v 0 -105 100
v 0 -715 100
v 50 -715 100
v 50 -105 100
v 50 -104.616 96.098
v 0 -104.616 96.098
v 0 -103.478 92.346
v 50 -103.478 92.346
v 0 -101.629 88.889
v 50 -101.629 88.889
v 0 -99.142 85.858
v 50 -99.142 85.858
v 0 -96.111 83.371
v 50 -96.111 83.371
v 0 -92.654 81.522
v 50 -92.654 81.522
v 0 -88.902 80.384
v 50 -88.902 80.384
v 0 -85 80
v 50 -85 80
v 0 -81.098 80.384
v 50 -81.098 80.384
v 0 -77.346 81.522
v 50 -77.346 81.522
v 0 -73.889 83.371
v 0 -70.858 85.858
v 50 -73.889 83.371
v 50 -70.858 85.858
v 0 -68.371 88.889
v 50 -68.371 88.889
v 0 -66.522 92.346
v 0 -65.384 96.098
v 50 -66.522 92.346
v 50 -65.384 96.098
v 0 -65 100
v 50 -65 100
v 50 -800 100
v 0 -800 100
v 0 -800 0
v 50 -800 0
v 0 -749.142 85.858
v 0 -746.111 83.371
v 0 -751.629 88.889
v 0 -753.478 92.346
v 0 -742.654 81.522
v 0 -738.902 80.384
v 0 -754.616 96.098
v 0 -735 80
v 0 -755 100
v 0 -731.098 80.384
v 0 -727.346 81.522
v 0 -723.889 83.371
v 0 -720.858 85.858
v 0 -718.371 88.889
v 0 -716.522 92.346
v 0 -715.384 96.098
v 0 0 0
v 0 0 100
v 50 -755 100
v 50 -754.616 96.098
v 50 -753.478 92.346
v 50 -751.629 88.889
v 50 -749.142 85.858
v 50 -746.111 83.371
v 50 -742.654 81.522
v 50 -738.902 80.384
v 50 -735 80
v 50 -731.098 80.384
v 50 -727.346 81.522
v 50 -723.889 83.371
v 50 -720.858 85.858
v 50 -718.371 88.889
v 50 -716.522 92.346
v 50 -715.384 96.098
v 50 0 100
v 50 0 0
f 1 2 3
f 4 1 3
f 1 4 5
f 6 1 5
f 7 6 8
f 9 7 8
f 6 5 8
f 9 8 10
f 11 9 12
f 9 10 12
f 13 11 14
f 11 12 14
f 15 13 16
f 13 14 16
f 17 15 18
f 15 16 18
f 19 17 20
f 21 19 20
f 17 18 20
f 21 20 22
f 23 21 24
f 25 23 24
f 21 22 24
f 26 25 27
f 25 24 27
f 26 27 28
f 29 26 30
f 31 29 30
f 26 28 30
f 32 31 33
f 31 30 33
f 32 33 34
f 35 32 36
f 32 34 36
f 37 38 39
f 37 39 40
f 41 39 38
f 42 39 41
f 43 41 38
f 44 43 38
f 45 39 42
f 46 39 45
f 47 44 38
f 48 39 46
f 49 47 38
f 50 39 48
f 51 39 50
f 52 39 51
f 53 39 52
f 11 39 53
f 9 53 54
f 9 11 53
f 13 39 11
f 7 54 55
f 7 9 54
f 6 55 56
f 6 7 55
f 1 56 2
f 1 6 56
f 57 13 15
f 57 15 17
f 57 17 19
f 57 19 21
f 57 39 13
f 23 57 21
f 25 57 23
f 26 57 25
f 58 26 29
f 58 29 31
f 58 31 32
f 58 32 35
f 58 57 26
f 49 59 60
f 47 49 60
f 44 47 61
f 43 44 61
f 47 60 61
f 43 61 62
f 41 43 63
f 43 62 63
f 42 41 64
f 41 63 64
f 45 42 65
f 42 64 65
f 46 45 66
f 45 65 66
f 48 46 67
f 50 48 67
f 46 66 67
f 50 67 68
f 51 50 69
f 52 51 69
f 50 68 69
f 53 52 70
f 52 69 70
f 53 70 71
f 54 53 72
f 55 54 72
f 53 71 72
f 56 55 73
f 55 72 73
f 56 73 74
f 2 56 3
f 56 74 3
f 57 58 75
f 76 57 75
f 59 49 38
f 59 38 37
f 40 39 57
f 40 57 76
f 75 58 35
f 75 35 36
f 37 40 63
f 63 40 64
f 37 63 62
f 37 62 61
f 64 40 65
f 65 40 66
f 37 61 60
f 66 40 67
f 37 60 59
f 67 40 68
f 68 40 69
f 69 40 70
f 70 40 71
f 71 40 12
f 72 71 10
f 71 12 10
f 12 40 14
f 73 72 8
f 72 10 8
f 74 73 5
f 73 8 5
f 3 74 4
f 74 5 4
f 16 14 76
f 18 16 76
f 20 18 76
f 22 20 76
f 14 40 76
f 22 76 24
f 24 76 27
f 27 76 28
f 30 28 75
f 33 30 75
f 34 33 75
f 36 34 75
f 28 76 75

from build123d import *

# Parameters (mm, degrees)
F0_W     = 50
F0_H     = 100
F1_DEPTH = 800
F3_DEPTH = 50.001


with BuildPart() as f1:
    # F0 (on Front) → F1 (new body)
    with BuildSketch(Plane.XZ):
        with Locations((25, 50)):
            Rectangle(F0_W, F0_H)
    extrude(amount=F1_DEPTH)

    # F2 (on face) → F3 (cut, through all)
    with BuildSketch(Plane.YZ.offset(50)):
        with BuildLine():
            Line((-715, 100), (-755, 100))
            ThreePointArc((-755, 100), (-735, 80), (-715, 100))
        make_face()
        with BuildLine():
            Line((-65, 100), (-105, 100))
            ThreePointArc((-105, 100), (-85, 80), (-65, 100))
        make_face()
    extrude(amount=-F3_DEPTH, mode=Mode.SUBTRACT)


solid = f1.part
